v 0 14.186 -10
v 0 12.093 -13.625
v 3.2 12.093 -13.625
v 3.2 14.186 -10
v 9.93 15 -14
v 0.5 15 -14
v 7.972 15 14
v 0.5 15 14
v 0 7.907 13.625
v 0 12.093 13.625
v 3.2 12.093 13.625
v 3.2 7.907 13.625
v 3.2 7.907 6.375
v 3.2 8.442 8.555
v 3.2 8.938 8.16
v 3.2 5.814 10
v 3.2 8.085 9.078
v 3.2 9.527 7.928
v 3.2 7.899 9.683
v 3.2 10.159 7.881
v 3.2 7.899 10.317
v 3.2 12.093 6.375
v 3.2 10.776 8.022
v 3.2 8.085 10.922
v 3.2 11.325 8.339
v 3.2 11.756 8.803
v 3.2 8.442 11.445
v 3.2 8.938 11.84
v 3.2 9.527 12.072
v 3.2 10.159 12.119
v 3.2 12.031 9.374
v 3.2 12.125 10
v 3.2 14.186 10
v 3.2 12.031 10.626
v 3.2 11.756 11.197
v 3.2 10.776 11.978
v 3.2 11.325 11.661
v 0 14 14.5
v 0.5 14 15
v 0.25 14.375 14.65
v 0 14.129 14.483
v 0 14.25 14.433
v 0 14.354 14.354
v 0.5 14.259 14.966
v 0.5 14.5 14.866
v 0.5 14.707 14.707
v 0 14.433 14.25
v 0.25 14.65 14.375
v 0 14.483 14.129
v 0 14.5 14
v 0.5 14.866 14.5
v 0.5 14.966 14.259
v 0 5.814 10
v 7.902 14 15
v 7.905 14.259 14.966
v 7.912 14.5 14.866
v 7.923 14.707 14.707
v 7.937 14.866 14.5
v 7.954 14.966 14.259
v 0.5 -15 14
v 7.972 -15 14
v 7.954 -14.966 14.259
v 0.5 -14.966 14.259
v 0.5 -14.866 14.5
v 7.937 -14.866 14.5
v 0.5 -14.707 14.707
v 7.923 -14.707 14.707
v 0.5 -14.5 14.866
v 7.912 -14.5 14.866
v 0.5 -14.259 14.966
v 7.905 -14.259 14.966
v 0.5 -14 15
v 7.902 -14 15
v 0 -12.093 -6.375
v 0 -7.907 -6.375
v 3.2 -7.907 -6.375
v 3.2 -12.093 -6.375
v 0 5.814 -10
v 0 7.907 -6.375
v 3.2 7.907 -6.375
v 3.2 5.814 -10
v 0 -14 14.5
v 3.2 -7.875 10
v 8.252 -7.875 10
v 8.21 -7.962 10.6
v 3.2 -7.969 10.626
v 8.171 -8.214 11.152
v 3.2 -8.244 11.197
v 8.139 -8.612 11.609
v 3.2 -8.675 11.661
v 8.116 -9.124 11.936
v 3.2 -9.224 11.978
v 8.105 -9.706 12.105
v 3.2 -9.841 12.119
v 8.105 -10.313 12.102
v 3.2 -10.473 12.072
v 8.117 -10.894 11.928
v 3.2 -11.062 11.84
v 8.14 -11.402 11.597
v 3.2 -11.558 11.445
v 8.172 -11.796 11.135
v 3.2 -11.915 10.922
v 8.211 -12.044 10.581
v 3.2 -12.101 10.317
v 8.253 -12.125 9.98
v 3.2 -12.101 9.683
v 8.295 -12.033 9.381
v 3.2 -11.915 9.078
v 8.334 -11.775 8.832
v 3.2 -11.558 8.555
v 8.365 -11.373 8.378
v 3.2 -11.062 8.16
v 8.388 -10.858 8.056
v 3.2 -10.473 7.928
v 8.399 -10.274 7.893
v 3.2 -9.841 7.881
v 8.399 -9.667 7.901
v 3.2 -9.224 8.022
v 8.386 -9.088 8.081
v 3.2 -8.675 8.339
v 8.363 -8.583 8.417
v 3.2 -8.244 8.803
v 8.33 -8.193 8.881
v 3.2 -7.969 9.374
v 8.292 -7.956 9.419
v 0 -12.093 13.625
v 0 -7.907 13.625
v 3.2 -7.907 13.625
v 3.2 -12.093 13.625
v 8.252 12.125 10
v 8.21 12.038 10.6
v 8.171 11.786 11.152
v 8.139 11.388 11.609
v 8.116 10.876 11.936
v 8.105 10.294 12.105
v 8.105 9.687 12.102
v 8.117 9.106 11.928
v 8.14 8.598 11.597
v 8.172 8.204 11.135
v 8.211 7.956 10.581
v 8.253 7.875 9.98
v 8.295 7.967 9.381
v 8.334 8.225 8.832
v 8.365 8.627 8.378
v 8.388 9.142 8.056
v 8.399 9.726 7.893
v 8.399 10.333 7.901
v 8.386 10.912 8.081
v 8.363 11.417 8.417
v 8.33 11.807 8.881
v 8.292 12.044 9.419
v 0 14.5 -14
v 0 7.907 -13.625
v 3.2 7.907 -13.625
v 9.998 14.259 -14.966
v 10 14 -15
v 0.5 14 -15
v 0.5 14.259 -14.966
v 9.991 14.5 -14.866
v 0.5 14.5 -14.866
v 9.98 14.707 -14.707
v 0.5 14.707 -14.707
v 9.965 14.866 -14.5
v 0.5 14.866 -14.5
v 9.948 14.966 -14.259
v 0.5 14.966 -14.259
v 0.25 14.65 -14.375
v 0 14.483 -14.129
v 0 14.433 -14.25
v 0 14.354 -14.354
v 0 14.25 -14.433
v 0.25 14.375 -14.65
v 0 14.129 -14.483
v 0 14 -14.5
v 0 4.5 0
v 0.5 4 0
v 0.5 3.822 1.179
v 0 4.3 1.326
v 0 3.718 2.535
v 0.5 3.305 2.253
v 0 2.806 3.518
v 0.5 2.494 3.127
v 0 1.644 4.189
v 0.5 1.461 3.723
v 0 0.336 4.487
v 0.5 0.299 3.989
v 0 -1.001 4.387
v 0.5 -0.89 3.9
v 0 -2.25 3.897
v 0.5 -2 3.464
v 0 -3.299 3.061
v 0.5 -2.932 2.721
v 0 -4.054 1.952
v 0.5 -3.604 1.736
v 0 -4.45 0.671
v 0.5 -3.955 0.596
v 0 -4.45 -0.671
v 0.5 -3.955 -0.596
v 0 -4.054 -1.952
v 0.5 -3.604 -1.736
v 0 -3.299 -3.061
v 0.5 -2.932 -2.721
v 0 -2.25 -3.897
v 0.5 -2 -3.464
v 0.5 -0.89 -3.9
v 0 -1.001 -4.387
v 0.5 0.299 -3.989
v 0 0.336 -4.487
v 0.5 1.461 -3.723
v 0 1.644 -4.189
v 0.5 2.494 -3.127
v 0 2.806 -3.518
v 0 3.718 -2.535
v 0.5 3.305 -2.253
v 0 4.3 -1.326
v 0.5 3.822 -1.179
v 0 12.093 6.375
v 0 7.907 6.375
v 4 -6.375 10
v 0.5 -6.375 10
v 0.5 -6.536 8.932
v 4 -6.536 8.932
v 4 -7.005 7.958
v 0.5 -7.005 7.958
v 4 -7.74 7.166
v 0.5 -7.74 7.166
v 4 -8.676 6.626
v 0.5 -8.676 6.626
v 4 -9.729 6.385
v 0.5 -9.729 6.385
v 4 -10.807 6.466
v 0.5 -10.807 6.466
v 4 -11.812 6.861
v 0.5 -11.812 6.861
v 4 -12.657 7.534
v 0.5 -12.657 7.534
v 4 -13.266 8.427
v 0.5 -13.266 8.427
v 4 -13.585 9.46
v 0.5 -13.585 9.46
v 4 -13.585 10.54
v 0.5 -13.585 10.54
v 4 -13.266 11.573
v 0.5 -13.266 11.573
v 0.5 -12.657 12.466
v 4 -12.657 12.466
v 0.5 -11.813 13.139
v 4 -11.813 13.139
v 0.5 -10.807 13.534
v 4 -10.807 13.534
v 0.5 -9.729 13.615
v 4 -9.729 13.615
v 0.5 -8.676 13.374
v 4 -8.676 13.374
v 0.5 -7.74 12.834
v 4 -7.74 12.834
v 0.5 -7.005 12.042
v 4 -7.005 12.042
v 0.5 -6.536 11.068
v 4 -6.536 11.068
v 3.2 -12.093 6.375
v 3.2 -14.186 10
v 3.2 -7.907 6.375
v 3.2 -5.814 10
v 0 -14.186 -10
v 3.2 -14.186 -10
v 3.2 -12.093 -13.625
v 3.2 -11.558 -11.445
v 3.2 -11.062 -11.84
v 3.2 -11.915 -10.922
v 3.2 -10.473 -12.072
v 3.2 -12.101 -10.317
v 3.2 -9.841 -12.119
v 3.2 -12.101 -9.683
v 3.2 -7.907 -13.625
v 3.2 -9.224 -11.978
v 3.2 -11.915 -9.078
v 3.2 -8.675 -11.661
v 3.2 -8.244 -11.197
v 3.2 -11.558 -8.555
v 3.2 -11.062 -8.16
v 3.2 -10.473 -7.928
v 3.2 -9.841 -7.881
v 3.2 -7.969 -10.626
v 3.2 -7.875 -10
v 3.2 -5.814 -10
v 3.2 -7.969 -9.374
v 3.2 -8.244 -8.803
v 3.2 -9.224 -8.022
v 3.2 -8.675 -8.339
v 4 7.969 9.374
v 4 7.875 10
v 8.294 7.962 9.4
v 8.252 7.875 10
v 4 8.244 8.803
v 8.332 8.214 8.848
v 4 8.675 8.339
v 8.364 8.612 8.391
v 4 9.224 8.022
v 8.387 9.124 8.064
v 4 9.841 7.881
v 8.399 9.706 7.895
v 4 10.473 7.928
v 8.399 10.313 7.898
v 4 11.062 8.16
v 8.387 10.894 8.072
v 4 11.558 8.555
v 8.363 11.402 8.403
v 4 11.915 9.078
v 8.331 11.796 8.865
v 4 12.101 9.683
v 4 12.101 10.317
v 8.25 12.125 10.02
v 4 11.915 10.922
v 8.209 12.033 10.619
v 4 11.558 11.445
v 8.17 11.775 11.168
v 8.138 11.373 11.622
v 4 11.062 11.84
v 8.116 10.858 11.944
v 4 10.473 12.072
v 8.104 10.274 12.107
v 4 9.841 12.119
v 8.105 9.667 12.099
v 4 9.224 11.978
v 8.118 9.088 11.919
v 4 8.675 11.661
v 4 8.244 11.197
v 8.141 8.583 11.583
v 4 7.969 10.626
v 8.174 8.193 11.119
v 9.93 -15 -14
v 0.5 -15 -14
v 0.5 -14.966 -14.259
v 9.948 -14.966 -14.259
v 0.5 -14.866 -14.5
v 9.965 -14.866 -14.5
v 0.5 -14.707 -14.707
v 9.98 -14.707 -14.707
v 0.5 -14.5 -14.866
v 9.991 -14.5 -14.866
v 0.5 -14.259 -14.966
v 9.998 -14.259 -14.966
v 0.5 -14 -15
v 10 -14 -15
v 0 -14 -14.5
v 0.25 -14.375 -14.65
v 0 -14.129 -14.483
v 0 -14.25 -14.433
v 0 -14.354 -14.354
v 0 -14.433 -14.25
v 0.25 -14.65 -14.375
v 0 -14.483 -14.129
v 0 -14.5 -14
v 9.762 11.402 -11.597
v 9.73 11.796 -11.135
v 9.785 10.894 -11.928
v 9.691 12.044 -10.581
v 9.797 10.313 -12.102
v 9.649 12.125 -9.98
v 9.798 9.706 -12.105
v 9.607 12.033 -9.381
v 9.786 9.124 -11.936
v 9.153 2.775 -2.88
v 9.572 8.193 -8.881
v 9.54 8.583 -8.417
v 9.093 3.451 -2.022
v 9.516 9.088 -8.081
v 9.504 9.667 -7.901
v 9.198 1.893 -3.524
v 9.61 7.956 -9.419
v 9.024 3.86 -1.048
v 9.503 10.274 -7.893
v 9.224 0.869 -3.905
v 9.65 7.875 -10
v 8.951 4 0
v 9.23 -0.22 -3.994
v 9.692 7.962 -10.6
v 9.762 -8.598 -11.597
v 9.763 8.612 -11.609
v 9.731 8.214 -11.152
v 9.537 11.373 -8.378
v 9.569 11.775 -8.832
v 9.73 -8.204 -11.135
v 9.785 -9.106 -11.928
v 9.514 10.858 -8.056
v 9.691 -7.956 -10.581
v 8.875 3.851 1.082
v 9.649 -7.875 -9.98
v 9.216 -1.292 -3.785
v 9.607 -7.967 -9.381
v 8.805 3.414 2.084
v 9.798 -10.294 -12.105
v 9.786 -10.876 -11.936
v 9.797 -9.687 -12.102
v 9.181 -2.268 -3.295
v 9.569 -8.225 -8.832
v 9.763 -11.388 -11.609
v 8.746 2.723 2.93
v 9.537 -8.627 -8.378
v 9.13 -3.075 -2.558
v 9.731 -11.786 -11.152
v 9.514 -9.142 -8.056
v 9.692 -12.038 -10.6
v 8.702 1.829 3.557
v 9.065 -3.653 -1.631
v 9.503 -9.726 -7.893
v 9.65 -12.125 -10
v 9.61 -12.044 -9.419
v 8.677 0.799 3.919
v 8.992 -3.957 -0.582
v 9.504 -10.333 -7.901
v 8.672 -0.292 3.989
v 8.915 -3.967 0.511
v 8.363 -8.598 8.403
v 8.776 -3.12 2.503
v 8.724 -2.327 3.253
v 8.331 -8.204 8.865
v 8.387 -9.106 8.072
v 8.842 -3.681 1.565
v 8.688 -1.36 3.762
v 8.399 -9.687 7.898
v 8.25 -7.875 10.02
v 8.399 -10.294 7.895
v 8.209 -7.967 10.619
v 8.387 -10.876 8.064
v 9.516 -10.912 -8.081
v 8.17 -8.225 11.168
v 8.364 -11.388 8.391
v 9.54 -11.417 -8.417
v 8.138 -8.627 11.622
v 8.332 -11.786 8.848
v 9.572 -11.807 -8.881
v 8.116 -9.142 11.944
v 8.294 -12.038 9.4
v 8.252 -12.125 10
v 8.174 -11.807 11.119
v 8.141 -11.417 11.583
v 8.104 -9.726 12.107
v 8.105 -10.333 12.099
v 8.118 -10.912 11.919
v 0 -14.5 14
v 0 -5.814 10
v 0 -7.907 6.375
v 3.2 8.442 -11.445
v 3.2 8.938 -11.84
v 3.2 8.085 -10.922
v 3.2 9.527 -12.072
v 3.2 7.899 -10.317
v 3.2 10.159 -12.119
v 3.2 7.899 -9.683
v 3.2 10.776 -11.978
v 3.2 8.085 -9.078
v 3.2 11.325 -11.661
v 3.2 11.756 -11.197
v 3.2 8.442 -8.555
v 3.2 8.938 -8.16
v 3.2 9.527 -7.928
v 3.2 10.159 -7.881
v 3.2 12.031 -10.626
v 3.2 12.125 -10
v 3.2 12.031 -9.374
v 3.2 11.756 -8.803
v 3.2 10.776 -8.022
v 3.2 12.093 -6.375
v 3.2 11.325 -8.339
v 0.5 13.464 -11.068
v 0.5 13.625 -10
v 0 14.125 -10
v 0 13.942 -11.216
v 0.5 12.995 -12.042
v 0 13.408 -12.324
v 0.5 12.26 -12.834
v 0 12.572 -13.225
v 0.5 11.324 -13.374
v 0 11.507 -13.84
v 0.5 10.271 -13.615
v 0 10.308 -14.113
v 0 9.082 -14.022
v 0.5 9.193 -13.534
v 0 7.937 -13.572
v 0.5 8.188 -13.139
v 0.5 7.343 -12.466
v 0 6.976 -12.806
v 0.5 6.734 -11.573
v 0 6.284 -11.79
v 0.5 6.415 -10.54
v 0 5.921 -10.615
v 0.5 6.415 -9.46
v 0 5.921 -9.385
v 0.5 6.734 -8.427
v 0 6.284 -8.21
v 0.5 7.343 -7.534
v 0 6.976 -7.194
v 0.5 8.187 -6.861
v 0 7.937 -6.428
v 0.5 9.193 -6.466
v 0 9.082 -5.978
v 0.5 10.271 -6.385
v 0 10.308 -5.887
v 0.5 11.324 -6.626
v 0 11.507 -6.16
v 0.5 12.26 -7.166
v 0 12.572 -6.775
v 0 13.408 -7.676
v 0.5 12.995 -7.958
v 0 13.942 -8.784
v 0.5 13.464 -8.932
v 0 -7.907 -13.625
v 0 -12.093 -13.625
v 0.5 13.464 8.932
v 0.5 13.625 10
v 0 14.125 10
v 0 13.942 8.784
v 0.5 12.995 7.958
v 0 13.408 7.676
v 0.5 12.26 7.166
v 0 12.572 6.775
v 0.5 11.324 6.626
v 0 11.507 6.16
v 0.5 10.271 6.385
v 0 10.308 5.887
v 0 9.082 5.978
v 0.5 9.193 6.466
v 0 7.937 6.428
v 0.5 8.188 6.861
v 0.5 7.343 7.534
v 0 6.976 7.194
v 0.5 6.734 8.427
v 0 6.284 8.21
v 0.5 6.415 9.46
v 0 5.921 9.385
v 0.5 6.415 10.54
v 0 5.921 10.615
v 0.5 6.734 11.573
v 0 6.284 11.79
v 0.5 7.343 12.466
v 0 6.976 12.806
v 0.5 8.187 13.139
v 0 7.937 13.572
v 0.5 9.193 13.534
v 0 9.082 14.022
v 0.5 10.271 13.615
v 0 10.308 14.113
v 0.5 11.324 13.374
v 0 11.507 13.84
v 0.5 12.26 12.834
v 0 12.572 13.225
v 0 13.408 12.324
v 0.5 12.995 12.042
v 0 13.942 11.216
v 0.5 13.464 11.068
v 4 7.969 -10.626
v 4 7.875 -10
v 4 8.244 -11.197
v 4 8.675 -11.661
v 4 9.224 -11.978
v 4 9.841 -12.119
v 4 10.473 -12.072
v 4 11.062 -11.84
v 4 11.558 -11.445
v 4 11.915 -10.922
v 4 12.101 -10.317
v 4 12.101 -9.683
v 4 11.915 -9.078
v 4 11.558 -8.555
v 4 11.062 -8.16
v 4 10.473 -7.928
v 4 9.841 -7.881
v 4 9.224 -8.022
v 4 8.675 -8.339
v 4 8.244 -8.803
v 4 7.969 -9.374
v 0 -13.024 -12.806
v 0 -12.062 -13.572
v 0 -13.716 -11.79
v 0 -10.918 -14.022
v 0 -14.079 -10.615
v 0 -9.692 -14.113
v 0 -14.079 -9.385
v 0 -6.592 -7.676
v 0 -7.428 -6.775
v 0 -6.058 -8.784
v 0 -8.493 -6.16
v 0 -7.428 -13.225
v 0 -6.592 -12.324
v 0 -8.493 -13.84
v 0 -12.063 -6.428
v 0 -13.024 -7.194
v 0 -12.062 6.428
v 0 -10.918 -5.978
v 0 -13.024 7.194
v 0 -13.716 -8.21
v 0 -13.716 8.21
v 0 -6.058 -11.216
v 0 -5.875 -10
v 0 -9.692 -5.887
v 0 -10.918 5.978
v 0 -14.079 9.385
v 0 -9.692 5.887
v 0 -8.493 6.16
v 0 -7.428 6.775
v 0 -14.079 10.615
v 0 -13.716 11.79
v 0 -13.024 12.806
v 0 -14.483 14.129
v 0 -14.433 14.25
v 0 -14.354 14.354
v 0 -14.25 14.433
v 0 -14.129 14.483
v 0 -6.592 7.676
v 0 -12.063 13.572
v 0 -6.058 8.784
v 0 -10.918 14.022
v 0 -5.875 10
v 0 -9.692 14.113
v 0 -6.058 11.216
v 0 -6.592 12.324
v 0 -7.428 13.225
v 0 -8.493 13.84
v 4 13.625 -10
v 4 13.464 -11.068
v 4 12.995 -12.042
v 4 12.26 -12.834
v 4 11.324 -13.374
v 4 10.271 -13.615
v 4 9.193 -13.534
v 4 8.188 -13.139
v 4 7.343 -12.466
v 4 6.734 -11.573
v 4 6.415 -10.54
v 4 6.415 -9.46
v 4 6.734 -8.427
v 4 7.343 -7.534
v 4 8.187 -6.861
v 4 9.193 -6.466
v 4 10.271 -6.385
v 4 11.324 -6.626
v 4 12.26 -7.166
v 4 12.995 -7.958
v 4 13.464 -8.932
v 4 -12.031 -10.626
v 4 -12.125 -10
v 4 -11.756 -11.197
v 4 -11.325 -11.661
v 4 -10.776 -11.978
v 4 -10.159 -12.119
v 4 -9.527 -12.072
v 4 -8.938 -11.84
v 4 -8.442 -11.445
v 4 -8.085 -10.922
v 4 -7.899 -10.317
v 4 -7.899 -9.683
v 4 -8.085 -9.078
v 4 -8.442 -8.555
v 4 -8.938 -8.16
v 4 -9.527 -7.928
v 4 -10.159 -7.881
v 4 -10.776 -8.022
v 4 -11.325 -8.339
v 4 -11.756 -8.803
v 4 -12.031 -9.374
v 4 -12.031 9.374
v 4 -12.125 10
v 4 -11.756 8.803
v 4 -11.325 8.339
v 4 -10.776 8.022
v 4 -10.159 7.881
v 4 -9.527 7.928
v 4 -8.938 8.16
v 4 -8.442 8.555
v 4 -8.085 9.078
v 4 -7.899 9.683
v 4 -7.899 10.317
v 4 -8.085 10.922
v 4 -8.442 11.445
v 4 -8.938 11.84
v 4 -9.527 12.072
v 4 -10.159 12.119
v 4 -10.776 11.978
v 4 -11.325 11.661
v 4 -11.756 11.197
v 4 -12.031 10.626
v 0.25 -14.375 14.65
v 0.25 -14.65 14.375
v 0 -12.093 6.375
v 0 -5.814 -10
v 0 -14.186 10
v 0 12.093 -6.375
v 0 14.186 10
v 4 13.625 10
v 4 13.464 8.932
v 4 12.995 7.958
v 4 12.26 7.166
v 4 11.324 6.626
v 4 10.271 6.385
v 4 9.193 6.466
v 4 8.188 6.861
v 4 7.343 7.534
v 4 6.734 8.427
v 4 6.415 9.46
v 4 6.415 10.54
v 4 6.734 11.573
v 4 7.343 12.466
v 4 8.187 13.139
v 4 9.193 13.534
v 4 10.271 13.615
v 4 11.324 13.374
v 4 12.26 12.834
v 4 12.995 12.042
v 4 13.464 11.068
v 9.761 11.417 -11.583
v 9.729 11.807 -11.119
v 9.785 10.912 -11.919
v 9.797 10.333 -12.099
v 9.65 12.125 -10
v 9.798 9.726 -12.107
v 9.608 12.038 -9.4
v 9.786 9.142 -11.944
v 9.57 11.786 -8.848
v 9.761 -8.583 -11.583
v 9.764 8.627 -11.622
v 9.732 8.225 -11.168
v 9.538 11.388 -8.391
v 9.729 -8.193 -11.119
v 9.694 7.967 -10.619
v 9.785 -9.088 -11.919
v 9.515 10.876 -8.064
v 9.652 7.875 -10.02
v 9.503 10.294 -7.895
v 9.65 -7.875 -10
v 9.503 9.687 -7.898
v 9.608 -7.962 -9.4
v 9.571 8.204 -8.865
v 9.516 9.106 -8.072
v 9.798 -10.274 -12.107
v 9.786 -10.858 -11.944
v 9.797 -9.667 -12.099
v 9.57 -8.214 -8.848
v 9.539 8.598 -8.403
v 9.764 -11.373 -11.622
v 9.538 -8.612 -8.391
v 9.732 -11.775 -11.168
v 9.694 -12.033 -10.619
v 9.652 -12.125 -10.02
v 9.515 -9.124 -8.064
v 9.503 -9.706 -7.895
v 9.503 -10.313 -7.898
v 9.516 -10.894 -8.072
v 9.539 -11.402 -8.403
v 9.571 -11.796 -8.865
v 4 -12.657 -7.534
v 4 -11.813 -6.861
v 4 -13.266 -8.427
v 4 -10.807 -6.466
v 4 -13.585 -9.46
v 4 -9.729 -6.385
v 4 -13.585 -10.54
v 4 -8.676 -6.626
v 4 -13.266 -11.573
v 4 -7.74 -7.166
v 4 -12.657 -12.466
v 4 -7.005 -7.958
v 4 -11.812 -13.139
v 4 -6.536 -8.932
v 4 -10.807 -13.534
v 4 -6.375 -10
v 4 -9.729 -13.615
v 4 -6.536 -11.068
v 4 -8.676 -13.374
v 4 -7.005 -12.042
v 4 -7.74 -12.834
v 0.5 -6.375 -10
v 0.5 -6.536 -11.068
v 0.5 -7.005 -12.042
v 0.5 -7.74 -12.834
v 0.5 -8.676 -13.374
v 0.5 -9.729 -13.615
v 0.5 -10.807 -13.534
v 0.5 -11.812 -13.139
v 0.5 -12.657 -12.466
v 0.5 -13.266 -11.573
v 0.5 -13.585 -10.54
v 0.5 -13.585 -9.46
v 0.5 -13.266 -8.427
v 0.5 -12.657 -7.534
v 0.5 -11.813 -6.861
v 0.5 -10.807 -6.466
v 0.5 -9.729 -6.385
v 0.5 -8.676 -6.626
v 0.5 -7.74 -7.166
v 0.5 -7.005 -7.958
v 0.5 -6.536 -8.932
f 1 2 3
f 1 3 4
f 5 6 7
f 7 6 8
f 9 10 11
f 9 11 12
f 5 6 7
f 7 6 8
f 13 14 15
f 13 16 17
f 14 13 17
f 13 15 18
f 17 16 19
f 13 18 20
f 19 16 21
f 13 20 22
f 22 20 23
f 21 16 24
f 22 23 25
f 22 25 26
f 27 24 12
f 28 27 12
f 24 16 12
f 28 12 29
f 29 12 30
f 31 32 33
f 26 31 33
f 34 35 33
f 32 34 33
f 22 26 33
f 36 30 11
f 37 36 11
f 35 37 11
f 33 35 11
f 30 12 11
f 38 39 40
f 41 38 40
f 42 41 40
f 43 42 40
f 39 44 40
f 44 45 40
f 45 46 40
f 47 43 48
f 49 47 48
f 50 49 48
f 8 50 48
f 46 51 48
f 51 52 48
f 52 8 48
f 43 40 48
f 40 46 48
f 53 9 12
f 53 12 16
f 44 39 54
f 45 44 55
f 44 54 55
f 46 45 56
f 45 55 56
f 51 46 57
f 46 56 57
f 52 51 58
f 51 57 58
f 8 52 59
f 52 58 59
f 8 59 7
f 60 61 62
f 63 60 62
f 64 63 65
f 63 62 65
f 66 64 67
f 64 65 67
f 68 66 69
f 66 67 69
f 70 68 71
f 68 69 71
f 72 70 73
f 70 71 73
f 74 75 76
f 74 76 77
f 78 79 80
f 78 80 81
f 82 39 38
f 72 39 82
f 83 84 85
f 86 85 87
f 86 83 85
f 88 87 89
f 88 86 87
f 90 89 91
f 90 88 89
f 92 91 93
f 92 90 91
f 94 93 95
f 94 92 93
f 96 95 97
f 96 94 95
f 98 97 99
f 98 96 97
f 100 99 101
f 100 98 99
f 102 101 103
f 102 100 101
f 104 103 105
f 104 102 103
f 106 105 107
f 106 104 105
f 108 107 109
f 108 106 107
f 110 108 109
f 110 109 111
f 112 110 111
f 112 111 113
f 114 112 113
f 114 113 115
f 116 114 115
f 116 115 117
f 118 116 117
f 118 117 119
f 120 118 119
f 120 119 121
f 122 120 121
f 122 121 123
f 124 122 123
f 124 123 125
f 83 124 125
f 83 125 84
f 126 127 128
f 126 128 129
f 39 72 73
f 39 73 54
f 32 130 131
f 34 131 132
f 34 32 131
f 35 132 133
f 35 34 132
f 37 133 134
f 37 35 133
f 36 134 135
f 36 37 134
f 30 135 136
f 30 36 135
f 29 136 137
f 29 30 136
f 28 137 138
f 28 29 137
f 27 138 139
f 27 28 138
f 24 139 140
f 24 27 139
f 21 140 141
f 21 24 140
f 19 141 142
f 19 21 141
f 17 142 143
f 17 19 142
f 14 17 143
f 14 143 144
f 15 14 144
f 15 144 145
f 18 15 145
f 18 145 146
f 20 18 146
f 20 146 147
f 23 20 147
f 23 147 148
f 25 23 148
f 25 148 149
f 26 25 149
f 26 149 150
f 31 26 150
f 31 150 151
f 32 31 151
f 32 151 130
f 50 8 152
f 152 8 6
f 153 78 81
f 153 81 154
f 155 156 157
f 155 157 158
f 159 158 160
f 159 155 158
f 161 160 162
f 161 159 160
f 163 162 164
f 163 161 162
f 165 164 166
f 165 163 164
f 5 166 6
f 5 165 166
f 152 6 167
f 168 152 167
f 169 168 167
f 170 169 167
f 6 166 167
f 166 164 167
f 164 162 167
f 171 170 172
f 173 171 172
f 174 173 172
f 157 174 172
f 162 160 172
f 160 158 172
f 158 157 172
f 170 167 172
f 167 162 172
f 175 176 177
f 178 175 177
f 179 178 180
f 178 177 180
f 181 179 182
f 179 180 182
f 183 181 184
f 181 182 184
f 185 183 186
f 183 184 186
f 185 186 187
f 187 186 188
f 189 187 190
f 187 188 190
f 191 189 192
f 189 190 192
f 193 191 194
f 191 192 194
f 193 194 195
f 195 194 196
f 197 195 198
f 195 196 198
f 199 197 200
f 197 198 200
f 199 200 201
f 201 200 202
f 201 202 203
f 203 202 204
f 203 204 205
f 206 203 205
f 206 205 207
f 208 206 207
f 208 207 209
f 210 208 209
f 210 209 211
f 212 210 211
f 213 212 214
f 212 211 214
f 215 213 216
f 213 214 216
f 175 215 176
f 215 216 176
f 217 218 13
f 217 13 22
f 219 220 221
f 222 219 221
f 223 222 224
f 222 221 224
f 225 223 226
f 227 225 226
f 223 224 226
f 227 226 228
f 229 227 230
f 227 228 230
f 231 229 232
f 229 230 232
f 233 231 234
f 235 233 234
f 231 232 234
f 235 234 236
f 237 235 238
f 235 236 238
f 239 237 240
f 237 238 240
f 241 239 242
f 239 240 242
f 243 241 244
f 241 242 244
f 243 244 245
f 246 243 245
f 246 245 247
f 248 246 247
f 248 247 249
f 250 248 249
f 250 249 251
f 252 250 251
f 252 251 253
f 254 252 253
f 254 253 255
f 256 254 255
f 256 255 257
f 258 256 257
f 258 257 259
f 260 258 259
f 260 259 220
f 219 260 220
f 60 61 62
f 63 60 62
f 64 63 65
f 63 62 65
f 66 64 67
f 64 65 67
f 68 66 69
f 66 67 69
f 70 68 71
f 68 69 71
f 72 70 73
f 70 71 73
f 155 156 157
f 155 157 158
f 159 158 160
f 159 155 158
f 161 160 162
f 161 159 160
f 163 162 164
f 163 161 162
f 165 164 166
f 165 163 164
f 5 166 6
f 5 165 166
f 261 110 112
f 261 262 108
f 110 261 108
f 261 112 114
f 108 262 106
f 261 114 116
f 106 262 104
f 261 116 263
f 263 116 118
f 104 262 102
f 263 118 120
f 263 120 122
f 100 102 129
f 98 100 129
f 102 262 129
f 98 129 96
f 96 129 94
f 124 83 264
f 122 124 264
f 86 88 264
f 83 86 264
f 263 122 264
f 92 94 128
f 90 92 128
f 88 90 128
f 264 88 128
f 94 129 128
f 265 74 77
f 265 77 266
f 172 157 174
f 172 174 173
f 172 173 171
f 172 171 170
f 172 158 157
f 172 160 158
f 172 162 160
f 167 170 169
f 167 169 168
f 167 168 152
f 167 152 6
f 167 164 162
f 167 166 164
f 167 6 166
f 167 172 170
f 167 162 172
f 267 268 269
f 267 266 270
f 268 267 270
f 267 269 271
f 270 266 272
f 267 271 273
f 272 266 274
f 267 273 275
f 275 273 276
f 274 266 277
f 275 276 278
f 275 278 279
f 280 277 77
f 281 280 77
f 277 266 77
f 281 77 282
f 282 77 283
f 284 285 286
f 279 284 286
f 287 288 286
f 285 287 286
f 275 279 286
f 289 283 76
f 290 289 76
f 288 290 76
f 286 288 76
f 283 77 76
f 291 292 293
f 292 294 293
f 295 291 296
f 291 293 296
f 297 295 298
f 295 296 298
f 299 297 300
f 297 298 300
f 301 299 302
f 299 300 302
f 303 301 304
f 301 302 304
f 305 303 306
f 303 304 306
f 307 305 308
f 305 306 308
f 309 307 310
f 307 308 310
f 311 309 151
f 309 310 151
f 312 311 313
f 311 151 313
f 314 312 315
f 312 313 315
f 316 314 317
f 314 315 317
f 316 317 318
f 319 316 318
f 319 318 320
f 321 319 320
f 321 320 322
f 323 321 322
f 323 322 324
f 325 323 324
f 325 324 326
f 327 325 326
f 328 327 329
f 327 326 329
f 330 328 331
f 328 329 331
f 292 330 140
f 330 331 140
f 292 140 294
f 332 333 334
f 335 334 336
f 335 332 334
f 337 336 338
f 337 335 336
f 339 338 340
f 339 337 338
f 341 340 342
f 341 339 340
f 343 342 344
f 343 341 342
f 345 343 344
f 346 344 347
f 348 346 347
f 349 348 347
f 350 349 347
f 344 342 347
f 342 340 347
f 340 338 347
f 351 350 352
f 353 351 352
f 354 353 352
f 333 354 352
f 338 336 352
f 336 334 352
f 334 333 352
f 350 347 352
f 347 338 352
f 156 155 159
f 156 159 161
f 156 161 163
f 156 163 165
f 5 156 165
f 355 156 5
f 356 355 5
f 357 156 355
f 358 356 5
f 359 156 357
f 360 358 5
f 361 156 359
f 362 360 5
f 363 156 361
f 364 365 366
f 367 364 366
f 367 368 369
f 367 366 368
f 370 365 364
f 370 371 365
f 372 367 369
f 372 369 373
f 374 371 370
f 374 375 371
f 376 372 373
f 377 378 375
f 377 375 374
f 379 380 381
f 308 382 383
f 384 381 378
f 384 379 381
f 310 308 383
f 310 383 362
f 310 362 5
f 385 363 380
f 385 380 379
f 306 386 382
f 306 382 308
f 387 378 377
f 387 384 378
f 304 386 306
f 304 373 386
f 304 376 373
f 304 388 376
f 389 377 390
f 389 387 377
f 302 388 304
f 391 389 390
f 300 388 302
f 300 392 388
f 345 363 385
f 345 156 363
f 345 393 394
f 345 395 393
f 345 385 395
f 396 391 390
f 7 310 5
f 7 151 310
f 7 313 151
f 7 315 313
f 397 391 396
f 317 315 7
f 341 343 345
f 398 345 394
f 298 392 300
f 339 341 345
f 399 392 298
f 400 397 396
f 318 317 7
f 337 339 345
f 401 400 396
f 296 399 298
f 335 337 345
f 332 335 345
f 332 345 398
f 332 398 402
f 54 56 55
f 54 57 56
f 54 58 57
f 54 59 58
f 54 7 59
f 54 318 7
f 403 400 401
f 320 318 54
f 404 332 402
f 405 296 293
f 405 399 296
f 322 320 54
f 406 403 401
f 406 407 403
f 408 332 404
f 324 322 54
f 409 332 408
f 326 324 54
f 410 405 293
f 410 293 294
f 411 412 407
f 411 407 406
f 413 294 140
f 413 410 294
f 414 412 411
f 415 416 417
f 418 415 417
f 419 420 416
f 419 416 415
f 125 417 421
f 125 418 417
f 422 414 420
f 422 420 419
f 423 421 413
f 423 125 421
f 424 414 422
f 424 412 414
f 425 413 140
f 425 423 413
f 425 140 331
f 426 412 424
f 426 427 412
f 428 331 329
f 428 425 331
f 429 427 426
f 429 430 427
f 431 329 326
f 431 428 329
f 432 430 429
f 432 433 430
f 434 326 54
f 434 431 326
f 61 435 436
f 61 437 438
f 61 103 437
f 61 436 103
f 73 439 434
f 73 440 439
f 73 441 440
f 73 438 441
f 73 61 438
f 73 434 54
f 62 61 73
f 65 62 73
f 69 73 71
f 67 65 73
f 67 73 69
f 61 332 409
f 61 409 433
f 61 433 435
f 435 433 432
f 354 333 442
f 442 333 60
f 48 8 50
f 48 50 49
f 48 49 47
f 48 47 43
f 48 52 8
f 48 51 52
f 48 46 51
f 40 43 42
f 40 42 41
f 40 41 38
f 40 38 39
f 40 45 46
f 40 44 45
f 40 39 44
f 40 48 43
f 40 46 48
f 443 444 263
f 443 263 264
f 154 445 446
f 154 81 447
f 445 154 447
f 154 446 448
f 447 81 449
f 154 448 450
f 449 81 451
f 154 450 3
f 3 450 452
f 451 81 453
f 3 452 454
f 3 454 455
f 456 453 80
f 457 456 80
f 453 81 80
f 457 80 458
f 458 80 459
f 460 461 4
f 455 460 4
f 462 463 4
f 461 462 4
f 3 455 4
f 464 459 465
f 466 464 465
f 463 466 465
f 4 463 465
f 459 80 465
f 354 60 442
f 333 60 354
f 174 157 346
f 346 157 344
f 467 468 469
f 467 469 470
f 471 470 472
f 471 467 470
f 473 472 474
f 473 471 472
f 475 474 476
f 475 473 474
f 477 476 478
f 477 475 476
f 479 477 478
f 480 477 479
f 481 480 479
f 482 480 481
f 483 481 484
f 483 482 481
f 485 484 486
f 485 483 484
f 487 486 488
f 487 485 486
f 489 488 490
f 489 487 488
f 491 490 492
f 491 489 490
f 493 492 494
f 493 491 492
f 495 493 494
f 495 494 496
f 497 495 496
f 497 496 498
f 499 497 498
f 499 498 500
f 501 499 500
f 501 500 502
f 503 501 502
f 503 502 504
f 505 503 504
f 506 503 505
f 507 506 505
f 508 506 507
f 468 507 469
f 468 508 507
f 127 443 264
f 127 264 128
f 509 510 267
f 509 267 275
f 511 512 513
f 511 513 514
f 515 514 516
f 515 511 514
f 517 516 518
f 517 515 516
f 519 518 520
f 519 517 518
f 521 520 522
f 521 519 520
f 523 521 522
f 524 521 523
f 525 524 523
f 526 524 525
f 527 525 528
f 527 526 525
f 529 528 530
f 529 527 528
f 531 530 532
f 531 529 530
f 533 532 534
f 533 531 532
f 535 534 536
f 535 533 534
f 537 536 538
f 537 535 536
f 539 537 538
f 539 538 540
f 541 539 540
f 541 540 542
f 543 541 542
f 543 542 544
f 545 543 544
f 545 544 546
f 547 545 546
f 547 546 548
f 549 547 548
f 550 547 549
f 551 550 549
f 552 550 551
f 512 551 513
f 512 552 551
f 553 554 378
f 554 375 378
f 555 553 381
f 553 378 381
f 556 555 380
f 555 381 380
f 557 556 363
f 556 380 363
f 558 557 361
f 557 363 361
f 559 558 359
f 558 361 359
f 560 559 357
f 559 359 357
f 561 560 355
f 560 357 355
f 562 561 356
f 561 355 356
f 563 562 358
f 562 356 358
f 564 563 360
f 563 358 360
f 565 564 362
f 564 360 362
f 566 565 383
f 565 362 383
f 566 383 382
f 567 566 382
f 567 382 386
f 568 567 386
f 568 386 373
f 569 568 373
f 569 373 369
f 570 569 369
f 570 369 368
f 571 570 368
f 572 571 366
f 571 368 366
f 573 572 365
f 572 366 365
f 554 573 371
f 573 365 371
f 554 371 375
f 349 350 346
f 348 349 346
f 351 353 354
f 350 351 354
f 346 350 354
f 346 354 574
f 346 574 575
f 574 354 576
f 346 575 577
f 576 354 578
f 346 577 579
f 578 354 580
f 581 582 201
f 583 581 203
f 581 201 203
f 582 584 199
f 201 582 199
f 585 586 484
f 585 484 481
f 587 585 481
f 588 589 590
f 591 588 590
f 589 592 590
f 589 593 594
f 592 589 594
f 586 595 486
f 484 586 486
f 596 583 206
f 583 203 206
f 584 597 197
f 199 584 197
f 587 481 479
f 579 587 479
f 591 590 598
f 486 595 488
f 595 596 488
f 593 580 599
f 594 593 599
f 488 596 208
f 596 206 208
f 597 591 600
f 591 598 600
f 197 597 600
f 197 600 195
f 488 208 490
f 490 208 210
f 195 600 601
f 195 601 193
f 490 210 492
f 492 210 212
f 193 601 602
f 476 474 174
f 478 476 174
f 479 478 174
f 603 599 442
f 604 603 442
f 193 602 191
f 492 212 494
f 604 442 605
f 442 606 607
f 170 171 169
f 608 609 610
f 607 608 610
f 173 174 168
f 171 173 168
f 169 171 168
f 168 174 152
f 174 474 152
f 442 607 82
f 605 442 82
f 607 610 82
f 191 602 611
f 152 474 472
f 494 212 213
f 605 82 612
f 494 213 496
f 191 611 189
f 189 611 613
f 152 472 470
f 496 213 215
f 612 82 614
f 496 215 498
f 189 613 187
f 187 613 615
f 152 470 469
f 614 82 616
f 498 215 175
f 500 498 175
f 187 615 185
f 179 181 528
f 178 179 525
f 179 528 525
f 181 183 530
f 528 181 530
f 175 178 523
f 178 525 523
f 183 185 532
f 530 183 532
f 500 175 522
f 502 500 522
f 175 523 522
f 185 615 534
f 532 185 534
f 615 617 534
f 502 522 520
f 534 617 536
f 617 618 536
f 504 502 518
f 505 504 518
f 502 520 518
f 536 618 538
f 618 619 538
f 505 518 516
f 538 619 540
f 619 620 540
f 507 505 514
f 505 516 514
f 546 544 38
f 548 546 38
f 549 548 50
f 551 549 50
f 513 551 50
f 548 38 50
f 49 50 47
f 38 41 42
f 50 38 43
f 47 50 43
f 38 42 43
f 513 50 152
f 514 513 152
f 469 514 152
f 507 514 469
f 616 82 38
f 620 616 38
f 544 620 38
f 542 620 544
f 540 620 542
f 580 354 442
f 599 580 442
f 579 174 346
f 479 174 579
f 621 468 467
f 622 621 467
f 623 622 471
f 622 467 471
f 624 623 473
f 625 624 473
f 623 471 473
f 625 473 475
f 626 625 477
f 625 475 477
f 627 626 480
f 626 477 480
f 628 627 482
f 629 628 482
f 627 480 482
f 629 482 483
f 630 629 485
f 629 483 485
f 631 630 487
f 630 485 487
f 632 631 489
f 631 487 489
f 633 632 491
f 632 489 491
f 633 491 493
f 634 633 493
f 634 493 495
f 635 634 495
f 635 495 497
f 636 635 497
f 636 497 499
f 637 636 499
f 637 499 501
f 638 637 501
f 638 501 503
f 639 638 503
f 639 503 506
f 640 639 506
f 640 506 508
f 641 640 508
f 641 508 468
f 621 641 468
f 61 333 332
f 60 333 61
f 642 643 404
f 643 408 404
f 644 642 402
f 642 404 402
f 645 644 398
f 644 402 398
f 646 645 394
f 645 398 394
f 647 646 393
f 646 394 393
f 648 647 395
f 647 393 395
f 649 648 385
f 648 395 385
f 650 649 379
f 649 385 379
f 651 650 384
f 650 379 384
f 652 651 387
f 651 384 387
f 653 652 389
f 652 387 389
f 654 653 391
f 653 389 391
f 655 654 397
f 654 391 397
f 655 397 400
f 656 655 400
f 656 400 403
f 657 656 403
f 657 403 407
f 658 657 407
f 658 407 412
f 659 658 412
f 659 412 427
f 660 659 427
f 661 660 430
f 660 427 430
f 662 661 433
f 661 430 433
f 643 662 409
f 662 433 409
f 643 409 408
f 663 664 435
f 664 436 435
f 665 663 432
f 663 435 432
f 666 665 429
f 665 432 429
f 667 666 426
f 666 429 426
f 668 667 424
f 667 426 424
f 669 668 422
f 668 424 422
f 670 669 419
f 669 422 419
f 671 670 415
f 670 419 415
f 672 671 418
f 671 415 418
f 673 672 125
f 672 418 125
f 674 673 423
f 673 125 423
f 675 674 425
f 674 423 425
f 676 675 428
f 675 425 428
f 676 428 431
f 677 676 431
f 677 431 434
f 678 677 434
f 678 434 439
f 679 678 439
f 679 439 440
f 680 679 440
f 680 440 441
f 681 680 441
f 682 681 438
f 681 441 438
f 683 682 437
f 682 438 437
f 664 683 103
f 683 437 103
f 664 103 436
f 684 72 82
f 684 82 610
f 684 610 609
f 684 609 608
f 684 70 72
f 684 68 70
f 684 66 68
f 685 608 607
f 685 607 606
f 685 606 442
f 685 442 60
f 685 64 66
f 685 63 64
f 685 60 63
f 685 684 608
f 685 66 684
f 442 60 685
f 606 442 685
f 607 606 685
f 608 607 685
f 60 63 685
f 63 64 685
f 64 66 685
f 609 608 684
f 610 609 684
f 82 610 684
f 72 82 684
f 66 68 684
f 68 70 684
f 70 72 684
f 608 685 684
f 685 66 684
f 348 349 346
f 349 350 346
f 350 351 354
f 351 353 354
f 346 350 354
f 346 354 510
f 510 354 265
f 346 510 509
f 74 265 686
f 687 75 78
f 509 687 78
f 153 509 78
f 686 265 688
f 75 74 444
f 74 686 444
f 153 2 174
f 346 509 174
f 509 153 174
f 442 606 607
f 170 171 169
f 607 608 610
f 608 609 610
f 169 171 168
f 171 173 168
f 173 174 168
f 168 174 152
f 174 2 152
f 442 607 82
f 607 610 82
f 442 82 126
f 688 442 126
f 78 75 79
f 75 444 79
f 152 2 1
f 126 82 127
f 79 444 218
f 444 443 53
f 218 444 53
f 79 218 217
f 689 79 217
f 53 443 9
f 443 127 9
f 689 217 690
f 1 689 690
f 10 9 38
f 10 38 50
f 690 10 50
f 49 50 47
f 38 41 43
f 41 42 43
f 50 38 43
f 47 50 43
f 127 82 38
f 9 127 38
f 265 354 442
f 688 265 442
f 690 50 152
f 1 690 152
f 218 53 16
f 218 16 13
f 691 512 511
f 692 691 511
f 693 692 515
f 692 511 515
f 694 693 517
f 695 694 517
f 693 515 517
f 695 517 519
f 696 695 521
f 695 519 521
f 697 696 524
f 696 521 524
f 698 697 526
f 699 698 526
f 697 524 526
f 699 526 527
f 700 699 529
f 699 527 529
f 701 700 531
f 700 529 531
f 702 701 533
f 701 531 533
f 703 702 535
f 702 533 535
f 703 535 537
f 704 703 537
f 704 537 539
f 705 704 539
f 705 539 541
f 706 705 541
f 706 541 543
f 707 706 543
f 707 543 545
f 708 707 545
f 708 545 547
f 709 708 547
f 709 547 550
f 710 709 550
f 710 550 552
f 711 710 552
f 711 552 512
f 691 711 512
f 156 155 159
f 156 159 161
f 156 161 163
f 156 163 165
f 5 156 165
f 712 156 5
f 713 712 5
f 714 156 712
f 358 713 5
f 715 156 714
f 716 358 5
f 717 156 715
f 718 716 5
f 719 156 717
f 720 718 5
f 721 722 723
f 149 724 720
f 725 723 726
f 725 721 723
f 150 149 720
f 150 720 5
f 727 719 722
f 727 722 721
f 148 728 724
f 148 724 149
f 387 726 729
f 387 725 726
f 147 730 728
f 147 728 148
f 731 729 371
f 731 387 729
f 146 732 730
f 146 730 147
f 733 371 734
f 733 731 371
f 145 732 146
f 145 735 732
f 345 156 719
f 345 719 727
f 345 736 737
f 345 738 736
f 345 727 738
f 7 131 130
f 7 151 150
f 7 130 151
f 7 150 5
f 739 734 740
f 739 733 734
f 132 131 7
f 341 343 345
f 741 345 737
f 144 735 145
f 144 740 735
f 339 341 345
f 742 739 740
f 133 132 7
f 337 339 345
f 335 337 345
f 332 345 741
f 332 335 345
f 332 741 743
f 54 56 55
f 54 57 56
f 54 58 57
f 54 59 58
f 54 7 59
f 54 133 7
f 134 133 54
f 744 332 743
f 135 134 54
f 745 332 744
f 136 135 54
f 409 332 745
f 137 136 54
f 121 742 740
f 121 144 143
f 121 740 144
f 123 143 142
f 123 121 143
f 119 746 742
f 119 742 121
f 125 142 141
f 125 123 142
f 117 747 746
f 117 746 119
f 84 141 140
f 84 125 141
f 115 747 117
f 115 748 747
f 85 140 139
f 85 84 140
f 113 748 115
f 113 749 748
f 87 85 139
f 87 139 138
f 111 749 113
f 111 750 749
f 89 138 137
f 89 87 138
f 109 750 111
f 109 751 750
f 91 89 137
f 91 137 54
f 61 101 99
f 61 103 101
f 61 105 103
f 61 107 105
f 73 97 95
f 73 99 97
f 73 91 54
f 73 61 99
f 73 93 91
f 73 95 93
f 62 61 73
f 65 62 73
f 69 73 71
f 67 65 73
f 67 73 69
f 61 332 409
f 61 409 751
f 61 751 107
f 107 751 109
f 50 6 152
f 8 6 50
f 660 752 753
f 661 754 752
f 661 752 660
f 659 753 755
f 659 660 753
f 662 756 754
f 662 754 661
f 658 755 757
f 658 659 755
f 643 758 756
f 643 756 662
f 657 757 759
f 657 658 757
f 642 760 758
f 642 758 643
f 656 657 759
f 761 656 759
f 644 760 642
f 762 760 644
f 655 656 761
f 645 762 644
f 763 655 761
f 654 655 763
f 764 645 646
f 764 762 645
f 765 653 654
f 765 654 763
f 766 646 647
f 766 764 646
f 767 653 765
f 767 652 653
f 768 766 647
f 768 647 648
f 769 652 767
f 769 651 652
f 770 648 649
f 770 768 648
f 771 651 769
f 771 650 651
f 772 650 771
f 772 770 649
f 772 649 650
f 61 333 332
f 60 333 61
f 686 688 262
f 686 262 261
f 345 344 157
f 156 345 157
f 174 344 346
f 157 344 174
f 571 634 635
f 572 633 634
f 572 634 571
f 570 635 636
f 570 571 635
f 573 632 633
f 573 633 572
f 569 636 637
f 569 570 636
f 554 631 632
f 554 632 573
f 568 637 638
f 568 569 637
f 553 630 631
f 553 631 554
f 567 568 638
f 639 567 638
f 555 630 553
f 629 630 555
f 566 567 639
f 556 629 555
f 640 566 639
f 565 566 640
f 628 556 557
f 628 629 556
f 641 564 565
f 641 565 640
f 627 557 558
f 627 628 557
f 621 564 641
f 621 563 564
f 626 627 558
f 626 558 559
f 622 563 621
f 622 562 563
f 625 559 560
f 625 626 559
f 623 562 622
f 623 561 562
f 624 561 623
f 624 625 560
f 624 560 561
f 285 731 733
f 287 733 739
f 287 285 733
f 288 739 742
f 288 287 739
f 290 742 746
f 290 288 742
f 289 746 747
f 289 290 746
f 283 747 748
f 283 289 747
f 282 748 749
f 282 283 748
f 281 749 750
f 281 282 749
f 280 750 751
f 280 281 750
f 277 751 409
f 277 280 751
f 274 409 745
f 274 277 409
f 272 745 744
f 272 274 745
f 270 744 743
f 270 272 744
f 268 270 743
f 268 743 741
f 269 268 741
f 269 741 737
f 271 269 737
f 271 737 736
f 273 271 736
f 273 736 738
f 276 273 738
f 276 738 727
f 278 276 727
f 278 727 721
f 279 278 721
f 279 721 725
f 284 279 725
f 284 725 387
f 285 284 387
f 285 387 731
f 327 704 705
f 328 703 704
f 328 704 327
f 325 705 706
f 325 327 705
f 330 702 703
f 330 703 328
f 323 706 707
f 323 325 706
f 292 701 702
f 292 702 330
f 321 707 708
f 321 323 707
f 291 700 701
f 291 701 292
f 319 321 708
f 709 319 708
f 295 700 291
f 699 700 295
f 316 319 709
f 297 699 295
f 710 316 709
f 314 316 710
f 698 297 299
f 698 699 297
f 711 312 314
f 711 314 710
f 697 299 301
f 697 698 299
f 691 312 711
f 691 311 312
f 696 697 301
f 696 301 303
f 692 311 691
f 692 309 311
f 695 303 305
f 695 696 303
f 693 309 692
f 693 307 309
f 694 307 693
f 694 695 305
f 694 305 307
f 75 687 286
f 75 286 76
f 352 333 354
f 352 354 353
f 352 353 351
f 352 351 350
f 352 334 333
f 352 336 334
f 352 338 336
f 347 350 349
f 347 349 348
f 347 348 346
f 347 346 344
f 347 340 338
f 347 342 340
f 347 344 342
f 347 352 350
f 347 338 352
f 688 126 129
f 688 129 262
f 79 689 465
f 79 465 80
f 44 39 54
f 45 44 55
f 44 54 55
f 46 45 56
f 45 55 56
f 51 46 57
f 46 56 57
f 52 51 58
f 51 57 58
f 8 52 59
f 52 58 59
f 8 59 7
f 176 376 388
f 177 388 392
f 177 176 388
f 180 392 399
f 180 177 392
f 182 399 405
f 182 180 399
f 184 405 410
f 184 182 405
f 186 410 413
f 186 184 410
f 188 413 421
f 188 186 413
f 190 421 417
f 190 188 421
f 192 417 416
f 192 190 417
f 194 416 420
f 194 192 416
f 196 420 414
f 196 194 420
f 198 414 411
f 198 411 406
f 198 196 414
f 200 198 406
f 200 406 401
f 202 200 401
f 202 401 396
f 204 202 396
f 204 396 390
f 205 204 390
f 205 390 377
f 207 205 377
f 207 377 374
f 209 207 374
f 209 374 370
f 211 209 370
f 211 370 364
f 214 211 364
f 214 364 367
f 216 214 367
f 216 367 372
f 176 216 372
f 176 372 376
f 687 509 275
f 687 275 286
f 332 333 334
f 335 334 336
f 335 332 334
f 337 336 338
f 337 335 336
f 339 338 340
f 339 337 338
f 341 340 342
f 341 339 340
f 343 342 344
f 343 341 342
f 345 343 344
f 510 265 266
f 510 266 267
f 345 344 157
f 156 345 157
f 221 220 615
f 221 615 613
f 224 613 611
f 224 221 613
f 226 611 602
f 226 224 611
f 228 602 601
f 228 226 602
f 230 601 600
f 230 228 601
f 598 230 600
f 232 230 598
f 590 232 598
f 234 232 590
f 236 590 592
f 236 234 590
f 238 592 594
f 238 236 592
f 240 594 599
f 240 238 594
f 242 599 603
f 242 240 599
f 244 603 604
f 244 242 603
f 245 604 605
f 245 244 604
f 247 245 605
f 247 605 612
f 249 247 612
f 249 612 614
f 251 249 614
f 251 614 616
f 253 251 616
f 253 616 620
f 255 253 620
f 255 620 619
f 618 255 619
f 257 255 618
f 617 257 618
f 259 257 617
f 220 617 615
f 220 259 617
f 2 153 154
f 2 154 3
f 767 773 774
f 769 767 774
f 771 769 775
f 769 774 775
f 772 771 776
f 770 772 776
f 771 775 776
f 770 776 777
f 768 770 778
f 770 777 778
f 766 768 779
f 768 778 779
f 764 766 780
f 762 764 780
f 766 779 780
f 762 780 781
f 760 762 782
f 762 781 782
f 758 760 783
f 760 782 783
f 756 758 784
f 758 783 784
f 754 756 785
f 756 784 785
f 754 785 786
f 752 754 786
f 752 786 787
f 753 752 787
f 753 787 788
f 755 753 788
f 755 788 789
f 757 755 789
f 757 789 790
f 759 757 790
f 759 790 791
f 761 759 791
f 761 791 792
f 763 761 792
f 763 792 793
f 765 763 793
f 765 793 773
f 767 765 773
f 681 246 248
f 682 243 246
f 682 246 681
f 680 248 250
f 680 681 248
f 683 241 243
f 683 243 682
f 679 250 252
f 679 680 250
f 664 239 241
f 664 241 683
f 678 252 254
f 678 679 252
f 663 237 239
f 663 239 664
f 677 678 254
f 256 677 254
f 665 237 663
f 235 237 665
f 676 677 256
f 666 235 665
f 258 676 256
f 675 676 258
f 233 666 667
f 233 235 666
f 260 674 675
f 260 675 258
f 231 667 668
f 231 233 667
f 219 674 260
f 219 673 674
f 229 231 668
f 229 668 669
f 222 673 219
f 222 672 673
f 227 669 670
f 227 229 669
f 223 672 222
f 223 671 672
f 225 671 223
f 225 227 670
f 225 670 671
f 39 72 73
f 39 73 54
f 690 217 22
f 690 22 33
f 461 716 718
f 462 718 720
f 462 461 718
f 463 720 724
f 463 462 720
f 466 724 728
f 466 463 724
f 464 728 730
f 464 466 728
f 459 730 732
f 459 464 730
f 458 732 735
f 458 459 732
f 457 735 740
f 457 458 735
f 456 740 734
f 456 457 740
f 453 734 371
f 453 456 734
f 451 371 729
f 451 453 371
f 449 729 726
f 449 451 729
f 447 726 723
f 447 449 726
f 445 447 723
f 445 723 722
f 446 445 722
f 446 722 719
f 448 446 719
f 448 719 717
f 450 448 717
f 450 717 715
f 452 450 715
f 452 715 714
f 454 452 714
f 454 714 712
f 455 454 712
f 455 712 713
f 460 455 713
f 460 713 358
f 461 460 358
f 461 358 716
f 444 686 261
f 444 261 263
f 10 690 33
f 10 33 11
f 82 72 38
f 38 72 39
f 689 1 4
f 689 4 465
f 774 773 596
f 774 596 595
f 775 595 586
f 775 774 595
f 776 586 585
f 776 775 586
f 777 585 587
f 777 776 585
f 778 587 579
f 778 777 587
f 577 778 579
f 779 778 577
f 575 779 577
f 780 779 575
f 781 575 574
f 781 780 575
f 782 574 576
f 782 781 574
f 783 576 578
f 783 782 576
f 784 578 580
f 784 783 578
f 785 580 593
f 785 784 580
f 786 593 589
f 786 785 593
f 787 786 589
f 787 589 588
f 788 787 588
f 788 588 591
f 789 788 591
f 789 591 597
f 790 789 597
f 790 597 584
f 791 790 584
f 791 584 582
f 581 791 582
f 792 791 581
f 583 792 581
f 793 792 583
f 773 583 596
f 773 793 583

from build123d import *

# Parameters (mm, degrees)
SKETCH_W         = 30
SKETCH_H         = 30
SKETCH_R         = 4
PAD_DEPTH        = 10
POCKET_DEPTH     = 30.001
HOLE_D           = 4.25
HOLE_DEPTH       = 25
HOLE_CBORE_D     = 7.25
HOLE_CBORE_DEPTH = 4
FILLET_R         = 1
CHAMFER_SIZE     = 0.5
SKETCH005_W      = 30
SKETCH005_H      = 30
PAD002_DEPTH     = 10
POCKET002_DEPTH  = 30.001
POCKET003_DEPTH  = 3.2
SKETCH008_R      = 2.125
HOLE001_DEPTH    = 10.001
FILLET001_R      = 1
CHAMFER002_SIZE  = 0.5


with BuildPart() as inner_guard:
    # Sketch → Pad (new body)
    with BuildSketch(Plane.YZ):
        Rectangle(SKETCH_W, SKETCH_H)
        Circle(SKETCH_R, mode=Mode.SUBTRACT)
    extrude(amount=PAD_DEPTH)

    # Sketch001 (on Face1 of Pad) → Pocket (cut, through all)
    with BuildSketch(Plane(origin=(0, -15, 0), x_dir=(0, 0, -1), z_dir=(0, -1, 0))):
        Polygon((25, 10.699268), (-25, 7.202928), (-25, 10.699268), align=None)
    extrude(amount=-POCKET_DEPTH, mode=Mode.SUBTRACT)

    # Hole
    with Locations(Plane(origin=(0, 0, 0), x_dir=(0, 1, 0), z_dir=(-1, 0, 0))):
        with Locations((10, -10), (-10, -10), (-10, 10), (10, 10)):
            CounterBoreHole(HOLE_D / 2, HOLE_CBORE_D / 2, HOLE_CBORE_DEPTH, depth=HOLE_DEPTH)

    # Fillet
    fillet_edges = [inner_guard.edges().sort_by_distance(p)[0] for p in [
        (3.951098, -15, 15),
        (5, -15, -15),
        (3.951098, 15, 15),
        (5, 15, -15),
    ]]
    fillet(fillet_edges, radius=FILLET_R)

    # Chamfer
    chamfer_edges = [inner_guard.edges().sort_by_distance(p)[0] for p in [
        (0, 15, 0),
        (0, 0, -15),
        (0, 0, 15),
        (0, -15, 0),
        (0, 13.625, -10),
        (0, 13.625, 10),
        (0, -6.375, 10),
        (0, -6.375, -10),
        (0, -4, 0),
    ]]
    chamfer(chamfer_edges, length=CHAMFER_SIZE)


with BuildPart() as outter_guard:
    # Sketch005 → Pad002 (new body)
    with BuildSketch(Plane.YZ):
        Rectangle(SKETCH005_W, SKETCH005_H)
    extrude(amount=PAD002_DEPTH)

    # Sketch006 (on Face1 of Pad002) → Pocket002 (cut, through all)
    with BuildSketch(Plane(origin=(0, -15, 0), x_dir=(0, 0, -1), z_dir=(0, -1, 0))):
        Polygon((25, 10.699268), (-25, 7.202928), (-25, 10.699268), align=None)
    extrude(amount=-POCKET002_DEPTH, mode=Mode.SUBTRACT)

    # Sketch007 → Pocket003 (cut)
    with BuildSketch(Plane.YZ):
        Polygon((-12.092895, 6.375), (-7.907105, 6.375), (-5.814211, 10), (-7.907105, 13.625), (-12.092895, 13.625), (-14.185789, 10), align=None)
        Polygon((7.907105, 6.375), (12.092895, 6.375), (14.185789, 10), (12.092895, 13.625), (7.907105, 13.625), (5.814211, 10), align=None)
        Polygon((7.907105, -13.625), (12.092895, -13.625), (14.185789, -10), (12.092895, -6.375), (7.907105, -6.375), (5.814211, -10), align=None)
        Polygon((-12.092895, -13.625), (-7.907105, -13.625), (-5.814211, -10), (-7.907105, -6.375), (-12.092895, -6.375), (-14.185789, -10), align=None)
    extrude(amount=POCKET003_DEPTH, mode=Mode.SUBTRACT)

    # Sketch008 → Hole001 (cut, through all)
    with BuildSketch(Plane.YZ):
        with Locations((10, 10)):
            Circle(SKETCH008_R)
        with Locations((-10, 10)):
            Circle(SKETCH008_R)
        with Locations((10, -10)):
            Circle(SKETCH008_R)
        with Locations((-10, -10)):
            Circle(SKETCH008_R)
    extrude(amount=HOLE001_DEPTH, mode=Mode.SUBTRACT)

    # Fillet001
    fillet001_edges = [outter_guard.edges().sort_by_distance(p)[0] for p in [
        (3.951098, -15, 15),
        (3.951098, 15, 15),
        (5, -15, -15),
        (5, 15, -15),
    ]]
    fillet(fillet001_edges, radius=FILLET001_R)

    # Chamfer002
    chamfer002_edges = [outter_guard.edges().sort_by_distance(p)[0] for p in [
        (0, 0, 15),
        (0, -15, 0),
        (0, 0, -15),
        (0, 15, 0),
    ]]
    chamfer(chamfer002_edges, length=CHAMFER002_SIZE)


solid = Compound([inner_guard.part, outter_guard.part])
